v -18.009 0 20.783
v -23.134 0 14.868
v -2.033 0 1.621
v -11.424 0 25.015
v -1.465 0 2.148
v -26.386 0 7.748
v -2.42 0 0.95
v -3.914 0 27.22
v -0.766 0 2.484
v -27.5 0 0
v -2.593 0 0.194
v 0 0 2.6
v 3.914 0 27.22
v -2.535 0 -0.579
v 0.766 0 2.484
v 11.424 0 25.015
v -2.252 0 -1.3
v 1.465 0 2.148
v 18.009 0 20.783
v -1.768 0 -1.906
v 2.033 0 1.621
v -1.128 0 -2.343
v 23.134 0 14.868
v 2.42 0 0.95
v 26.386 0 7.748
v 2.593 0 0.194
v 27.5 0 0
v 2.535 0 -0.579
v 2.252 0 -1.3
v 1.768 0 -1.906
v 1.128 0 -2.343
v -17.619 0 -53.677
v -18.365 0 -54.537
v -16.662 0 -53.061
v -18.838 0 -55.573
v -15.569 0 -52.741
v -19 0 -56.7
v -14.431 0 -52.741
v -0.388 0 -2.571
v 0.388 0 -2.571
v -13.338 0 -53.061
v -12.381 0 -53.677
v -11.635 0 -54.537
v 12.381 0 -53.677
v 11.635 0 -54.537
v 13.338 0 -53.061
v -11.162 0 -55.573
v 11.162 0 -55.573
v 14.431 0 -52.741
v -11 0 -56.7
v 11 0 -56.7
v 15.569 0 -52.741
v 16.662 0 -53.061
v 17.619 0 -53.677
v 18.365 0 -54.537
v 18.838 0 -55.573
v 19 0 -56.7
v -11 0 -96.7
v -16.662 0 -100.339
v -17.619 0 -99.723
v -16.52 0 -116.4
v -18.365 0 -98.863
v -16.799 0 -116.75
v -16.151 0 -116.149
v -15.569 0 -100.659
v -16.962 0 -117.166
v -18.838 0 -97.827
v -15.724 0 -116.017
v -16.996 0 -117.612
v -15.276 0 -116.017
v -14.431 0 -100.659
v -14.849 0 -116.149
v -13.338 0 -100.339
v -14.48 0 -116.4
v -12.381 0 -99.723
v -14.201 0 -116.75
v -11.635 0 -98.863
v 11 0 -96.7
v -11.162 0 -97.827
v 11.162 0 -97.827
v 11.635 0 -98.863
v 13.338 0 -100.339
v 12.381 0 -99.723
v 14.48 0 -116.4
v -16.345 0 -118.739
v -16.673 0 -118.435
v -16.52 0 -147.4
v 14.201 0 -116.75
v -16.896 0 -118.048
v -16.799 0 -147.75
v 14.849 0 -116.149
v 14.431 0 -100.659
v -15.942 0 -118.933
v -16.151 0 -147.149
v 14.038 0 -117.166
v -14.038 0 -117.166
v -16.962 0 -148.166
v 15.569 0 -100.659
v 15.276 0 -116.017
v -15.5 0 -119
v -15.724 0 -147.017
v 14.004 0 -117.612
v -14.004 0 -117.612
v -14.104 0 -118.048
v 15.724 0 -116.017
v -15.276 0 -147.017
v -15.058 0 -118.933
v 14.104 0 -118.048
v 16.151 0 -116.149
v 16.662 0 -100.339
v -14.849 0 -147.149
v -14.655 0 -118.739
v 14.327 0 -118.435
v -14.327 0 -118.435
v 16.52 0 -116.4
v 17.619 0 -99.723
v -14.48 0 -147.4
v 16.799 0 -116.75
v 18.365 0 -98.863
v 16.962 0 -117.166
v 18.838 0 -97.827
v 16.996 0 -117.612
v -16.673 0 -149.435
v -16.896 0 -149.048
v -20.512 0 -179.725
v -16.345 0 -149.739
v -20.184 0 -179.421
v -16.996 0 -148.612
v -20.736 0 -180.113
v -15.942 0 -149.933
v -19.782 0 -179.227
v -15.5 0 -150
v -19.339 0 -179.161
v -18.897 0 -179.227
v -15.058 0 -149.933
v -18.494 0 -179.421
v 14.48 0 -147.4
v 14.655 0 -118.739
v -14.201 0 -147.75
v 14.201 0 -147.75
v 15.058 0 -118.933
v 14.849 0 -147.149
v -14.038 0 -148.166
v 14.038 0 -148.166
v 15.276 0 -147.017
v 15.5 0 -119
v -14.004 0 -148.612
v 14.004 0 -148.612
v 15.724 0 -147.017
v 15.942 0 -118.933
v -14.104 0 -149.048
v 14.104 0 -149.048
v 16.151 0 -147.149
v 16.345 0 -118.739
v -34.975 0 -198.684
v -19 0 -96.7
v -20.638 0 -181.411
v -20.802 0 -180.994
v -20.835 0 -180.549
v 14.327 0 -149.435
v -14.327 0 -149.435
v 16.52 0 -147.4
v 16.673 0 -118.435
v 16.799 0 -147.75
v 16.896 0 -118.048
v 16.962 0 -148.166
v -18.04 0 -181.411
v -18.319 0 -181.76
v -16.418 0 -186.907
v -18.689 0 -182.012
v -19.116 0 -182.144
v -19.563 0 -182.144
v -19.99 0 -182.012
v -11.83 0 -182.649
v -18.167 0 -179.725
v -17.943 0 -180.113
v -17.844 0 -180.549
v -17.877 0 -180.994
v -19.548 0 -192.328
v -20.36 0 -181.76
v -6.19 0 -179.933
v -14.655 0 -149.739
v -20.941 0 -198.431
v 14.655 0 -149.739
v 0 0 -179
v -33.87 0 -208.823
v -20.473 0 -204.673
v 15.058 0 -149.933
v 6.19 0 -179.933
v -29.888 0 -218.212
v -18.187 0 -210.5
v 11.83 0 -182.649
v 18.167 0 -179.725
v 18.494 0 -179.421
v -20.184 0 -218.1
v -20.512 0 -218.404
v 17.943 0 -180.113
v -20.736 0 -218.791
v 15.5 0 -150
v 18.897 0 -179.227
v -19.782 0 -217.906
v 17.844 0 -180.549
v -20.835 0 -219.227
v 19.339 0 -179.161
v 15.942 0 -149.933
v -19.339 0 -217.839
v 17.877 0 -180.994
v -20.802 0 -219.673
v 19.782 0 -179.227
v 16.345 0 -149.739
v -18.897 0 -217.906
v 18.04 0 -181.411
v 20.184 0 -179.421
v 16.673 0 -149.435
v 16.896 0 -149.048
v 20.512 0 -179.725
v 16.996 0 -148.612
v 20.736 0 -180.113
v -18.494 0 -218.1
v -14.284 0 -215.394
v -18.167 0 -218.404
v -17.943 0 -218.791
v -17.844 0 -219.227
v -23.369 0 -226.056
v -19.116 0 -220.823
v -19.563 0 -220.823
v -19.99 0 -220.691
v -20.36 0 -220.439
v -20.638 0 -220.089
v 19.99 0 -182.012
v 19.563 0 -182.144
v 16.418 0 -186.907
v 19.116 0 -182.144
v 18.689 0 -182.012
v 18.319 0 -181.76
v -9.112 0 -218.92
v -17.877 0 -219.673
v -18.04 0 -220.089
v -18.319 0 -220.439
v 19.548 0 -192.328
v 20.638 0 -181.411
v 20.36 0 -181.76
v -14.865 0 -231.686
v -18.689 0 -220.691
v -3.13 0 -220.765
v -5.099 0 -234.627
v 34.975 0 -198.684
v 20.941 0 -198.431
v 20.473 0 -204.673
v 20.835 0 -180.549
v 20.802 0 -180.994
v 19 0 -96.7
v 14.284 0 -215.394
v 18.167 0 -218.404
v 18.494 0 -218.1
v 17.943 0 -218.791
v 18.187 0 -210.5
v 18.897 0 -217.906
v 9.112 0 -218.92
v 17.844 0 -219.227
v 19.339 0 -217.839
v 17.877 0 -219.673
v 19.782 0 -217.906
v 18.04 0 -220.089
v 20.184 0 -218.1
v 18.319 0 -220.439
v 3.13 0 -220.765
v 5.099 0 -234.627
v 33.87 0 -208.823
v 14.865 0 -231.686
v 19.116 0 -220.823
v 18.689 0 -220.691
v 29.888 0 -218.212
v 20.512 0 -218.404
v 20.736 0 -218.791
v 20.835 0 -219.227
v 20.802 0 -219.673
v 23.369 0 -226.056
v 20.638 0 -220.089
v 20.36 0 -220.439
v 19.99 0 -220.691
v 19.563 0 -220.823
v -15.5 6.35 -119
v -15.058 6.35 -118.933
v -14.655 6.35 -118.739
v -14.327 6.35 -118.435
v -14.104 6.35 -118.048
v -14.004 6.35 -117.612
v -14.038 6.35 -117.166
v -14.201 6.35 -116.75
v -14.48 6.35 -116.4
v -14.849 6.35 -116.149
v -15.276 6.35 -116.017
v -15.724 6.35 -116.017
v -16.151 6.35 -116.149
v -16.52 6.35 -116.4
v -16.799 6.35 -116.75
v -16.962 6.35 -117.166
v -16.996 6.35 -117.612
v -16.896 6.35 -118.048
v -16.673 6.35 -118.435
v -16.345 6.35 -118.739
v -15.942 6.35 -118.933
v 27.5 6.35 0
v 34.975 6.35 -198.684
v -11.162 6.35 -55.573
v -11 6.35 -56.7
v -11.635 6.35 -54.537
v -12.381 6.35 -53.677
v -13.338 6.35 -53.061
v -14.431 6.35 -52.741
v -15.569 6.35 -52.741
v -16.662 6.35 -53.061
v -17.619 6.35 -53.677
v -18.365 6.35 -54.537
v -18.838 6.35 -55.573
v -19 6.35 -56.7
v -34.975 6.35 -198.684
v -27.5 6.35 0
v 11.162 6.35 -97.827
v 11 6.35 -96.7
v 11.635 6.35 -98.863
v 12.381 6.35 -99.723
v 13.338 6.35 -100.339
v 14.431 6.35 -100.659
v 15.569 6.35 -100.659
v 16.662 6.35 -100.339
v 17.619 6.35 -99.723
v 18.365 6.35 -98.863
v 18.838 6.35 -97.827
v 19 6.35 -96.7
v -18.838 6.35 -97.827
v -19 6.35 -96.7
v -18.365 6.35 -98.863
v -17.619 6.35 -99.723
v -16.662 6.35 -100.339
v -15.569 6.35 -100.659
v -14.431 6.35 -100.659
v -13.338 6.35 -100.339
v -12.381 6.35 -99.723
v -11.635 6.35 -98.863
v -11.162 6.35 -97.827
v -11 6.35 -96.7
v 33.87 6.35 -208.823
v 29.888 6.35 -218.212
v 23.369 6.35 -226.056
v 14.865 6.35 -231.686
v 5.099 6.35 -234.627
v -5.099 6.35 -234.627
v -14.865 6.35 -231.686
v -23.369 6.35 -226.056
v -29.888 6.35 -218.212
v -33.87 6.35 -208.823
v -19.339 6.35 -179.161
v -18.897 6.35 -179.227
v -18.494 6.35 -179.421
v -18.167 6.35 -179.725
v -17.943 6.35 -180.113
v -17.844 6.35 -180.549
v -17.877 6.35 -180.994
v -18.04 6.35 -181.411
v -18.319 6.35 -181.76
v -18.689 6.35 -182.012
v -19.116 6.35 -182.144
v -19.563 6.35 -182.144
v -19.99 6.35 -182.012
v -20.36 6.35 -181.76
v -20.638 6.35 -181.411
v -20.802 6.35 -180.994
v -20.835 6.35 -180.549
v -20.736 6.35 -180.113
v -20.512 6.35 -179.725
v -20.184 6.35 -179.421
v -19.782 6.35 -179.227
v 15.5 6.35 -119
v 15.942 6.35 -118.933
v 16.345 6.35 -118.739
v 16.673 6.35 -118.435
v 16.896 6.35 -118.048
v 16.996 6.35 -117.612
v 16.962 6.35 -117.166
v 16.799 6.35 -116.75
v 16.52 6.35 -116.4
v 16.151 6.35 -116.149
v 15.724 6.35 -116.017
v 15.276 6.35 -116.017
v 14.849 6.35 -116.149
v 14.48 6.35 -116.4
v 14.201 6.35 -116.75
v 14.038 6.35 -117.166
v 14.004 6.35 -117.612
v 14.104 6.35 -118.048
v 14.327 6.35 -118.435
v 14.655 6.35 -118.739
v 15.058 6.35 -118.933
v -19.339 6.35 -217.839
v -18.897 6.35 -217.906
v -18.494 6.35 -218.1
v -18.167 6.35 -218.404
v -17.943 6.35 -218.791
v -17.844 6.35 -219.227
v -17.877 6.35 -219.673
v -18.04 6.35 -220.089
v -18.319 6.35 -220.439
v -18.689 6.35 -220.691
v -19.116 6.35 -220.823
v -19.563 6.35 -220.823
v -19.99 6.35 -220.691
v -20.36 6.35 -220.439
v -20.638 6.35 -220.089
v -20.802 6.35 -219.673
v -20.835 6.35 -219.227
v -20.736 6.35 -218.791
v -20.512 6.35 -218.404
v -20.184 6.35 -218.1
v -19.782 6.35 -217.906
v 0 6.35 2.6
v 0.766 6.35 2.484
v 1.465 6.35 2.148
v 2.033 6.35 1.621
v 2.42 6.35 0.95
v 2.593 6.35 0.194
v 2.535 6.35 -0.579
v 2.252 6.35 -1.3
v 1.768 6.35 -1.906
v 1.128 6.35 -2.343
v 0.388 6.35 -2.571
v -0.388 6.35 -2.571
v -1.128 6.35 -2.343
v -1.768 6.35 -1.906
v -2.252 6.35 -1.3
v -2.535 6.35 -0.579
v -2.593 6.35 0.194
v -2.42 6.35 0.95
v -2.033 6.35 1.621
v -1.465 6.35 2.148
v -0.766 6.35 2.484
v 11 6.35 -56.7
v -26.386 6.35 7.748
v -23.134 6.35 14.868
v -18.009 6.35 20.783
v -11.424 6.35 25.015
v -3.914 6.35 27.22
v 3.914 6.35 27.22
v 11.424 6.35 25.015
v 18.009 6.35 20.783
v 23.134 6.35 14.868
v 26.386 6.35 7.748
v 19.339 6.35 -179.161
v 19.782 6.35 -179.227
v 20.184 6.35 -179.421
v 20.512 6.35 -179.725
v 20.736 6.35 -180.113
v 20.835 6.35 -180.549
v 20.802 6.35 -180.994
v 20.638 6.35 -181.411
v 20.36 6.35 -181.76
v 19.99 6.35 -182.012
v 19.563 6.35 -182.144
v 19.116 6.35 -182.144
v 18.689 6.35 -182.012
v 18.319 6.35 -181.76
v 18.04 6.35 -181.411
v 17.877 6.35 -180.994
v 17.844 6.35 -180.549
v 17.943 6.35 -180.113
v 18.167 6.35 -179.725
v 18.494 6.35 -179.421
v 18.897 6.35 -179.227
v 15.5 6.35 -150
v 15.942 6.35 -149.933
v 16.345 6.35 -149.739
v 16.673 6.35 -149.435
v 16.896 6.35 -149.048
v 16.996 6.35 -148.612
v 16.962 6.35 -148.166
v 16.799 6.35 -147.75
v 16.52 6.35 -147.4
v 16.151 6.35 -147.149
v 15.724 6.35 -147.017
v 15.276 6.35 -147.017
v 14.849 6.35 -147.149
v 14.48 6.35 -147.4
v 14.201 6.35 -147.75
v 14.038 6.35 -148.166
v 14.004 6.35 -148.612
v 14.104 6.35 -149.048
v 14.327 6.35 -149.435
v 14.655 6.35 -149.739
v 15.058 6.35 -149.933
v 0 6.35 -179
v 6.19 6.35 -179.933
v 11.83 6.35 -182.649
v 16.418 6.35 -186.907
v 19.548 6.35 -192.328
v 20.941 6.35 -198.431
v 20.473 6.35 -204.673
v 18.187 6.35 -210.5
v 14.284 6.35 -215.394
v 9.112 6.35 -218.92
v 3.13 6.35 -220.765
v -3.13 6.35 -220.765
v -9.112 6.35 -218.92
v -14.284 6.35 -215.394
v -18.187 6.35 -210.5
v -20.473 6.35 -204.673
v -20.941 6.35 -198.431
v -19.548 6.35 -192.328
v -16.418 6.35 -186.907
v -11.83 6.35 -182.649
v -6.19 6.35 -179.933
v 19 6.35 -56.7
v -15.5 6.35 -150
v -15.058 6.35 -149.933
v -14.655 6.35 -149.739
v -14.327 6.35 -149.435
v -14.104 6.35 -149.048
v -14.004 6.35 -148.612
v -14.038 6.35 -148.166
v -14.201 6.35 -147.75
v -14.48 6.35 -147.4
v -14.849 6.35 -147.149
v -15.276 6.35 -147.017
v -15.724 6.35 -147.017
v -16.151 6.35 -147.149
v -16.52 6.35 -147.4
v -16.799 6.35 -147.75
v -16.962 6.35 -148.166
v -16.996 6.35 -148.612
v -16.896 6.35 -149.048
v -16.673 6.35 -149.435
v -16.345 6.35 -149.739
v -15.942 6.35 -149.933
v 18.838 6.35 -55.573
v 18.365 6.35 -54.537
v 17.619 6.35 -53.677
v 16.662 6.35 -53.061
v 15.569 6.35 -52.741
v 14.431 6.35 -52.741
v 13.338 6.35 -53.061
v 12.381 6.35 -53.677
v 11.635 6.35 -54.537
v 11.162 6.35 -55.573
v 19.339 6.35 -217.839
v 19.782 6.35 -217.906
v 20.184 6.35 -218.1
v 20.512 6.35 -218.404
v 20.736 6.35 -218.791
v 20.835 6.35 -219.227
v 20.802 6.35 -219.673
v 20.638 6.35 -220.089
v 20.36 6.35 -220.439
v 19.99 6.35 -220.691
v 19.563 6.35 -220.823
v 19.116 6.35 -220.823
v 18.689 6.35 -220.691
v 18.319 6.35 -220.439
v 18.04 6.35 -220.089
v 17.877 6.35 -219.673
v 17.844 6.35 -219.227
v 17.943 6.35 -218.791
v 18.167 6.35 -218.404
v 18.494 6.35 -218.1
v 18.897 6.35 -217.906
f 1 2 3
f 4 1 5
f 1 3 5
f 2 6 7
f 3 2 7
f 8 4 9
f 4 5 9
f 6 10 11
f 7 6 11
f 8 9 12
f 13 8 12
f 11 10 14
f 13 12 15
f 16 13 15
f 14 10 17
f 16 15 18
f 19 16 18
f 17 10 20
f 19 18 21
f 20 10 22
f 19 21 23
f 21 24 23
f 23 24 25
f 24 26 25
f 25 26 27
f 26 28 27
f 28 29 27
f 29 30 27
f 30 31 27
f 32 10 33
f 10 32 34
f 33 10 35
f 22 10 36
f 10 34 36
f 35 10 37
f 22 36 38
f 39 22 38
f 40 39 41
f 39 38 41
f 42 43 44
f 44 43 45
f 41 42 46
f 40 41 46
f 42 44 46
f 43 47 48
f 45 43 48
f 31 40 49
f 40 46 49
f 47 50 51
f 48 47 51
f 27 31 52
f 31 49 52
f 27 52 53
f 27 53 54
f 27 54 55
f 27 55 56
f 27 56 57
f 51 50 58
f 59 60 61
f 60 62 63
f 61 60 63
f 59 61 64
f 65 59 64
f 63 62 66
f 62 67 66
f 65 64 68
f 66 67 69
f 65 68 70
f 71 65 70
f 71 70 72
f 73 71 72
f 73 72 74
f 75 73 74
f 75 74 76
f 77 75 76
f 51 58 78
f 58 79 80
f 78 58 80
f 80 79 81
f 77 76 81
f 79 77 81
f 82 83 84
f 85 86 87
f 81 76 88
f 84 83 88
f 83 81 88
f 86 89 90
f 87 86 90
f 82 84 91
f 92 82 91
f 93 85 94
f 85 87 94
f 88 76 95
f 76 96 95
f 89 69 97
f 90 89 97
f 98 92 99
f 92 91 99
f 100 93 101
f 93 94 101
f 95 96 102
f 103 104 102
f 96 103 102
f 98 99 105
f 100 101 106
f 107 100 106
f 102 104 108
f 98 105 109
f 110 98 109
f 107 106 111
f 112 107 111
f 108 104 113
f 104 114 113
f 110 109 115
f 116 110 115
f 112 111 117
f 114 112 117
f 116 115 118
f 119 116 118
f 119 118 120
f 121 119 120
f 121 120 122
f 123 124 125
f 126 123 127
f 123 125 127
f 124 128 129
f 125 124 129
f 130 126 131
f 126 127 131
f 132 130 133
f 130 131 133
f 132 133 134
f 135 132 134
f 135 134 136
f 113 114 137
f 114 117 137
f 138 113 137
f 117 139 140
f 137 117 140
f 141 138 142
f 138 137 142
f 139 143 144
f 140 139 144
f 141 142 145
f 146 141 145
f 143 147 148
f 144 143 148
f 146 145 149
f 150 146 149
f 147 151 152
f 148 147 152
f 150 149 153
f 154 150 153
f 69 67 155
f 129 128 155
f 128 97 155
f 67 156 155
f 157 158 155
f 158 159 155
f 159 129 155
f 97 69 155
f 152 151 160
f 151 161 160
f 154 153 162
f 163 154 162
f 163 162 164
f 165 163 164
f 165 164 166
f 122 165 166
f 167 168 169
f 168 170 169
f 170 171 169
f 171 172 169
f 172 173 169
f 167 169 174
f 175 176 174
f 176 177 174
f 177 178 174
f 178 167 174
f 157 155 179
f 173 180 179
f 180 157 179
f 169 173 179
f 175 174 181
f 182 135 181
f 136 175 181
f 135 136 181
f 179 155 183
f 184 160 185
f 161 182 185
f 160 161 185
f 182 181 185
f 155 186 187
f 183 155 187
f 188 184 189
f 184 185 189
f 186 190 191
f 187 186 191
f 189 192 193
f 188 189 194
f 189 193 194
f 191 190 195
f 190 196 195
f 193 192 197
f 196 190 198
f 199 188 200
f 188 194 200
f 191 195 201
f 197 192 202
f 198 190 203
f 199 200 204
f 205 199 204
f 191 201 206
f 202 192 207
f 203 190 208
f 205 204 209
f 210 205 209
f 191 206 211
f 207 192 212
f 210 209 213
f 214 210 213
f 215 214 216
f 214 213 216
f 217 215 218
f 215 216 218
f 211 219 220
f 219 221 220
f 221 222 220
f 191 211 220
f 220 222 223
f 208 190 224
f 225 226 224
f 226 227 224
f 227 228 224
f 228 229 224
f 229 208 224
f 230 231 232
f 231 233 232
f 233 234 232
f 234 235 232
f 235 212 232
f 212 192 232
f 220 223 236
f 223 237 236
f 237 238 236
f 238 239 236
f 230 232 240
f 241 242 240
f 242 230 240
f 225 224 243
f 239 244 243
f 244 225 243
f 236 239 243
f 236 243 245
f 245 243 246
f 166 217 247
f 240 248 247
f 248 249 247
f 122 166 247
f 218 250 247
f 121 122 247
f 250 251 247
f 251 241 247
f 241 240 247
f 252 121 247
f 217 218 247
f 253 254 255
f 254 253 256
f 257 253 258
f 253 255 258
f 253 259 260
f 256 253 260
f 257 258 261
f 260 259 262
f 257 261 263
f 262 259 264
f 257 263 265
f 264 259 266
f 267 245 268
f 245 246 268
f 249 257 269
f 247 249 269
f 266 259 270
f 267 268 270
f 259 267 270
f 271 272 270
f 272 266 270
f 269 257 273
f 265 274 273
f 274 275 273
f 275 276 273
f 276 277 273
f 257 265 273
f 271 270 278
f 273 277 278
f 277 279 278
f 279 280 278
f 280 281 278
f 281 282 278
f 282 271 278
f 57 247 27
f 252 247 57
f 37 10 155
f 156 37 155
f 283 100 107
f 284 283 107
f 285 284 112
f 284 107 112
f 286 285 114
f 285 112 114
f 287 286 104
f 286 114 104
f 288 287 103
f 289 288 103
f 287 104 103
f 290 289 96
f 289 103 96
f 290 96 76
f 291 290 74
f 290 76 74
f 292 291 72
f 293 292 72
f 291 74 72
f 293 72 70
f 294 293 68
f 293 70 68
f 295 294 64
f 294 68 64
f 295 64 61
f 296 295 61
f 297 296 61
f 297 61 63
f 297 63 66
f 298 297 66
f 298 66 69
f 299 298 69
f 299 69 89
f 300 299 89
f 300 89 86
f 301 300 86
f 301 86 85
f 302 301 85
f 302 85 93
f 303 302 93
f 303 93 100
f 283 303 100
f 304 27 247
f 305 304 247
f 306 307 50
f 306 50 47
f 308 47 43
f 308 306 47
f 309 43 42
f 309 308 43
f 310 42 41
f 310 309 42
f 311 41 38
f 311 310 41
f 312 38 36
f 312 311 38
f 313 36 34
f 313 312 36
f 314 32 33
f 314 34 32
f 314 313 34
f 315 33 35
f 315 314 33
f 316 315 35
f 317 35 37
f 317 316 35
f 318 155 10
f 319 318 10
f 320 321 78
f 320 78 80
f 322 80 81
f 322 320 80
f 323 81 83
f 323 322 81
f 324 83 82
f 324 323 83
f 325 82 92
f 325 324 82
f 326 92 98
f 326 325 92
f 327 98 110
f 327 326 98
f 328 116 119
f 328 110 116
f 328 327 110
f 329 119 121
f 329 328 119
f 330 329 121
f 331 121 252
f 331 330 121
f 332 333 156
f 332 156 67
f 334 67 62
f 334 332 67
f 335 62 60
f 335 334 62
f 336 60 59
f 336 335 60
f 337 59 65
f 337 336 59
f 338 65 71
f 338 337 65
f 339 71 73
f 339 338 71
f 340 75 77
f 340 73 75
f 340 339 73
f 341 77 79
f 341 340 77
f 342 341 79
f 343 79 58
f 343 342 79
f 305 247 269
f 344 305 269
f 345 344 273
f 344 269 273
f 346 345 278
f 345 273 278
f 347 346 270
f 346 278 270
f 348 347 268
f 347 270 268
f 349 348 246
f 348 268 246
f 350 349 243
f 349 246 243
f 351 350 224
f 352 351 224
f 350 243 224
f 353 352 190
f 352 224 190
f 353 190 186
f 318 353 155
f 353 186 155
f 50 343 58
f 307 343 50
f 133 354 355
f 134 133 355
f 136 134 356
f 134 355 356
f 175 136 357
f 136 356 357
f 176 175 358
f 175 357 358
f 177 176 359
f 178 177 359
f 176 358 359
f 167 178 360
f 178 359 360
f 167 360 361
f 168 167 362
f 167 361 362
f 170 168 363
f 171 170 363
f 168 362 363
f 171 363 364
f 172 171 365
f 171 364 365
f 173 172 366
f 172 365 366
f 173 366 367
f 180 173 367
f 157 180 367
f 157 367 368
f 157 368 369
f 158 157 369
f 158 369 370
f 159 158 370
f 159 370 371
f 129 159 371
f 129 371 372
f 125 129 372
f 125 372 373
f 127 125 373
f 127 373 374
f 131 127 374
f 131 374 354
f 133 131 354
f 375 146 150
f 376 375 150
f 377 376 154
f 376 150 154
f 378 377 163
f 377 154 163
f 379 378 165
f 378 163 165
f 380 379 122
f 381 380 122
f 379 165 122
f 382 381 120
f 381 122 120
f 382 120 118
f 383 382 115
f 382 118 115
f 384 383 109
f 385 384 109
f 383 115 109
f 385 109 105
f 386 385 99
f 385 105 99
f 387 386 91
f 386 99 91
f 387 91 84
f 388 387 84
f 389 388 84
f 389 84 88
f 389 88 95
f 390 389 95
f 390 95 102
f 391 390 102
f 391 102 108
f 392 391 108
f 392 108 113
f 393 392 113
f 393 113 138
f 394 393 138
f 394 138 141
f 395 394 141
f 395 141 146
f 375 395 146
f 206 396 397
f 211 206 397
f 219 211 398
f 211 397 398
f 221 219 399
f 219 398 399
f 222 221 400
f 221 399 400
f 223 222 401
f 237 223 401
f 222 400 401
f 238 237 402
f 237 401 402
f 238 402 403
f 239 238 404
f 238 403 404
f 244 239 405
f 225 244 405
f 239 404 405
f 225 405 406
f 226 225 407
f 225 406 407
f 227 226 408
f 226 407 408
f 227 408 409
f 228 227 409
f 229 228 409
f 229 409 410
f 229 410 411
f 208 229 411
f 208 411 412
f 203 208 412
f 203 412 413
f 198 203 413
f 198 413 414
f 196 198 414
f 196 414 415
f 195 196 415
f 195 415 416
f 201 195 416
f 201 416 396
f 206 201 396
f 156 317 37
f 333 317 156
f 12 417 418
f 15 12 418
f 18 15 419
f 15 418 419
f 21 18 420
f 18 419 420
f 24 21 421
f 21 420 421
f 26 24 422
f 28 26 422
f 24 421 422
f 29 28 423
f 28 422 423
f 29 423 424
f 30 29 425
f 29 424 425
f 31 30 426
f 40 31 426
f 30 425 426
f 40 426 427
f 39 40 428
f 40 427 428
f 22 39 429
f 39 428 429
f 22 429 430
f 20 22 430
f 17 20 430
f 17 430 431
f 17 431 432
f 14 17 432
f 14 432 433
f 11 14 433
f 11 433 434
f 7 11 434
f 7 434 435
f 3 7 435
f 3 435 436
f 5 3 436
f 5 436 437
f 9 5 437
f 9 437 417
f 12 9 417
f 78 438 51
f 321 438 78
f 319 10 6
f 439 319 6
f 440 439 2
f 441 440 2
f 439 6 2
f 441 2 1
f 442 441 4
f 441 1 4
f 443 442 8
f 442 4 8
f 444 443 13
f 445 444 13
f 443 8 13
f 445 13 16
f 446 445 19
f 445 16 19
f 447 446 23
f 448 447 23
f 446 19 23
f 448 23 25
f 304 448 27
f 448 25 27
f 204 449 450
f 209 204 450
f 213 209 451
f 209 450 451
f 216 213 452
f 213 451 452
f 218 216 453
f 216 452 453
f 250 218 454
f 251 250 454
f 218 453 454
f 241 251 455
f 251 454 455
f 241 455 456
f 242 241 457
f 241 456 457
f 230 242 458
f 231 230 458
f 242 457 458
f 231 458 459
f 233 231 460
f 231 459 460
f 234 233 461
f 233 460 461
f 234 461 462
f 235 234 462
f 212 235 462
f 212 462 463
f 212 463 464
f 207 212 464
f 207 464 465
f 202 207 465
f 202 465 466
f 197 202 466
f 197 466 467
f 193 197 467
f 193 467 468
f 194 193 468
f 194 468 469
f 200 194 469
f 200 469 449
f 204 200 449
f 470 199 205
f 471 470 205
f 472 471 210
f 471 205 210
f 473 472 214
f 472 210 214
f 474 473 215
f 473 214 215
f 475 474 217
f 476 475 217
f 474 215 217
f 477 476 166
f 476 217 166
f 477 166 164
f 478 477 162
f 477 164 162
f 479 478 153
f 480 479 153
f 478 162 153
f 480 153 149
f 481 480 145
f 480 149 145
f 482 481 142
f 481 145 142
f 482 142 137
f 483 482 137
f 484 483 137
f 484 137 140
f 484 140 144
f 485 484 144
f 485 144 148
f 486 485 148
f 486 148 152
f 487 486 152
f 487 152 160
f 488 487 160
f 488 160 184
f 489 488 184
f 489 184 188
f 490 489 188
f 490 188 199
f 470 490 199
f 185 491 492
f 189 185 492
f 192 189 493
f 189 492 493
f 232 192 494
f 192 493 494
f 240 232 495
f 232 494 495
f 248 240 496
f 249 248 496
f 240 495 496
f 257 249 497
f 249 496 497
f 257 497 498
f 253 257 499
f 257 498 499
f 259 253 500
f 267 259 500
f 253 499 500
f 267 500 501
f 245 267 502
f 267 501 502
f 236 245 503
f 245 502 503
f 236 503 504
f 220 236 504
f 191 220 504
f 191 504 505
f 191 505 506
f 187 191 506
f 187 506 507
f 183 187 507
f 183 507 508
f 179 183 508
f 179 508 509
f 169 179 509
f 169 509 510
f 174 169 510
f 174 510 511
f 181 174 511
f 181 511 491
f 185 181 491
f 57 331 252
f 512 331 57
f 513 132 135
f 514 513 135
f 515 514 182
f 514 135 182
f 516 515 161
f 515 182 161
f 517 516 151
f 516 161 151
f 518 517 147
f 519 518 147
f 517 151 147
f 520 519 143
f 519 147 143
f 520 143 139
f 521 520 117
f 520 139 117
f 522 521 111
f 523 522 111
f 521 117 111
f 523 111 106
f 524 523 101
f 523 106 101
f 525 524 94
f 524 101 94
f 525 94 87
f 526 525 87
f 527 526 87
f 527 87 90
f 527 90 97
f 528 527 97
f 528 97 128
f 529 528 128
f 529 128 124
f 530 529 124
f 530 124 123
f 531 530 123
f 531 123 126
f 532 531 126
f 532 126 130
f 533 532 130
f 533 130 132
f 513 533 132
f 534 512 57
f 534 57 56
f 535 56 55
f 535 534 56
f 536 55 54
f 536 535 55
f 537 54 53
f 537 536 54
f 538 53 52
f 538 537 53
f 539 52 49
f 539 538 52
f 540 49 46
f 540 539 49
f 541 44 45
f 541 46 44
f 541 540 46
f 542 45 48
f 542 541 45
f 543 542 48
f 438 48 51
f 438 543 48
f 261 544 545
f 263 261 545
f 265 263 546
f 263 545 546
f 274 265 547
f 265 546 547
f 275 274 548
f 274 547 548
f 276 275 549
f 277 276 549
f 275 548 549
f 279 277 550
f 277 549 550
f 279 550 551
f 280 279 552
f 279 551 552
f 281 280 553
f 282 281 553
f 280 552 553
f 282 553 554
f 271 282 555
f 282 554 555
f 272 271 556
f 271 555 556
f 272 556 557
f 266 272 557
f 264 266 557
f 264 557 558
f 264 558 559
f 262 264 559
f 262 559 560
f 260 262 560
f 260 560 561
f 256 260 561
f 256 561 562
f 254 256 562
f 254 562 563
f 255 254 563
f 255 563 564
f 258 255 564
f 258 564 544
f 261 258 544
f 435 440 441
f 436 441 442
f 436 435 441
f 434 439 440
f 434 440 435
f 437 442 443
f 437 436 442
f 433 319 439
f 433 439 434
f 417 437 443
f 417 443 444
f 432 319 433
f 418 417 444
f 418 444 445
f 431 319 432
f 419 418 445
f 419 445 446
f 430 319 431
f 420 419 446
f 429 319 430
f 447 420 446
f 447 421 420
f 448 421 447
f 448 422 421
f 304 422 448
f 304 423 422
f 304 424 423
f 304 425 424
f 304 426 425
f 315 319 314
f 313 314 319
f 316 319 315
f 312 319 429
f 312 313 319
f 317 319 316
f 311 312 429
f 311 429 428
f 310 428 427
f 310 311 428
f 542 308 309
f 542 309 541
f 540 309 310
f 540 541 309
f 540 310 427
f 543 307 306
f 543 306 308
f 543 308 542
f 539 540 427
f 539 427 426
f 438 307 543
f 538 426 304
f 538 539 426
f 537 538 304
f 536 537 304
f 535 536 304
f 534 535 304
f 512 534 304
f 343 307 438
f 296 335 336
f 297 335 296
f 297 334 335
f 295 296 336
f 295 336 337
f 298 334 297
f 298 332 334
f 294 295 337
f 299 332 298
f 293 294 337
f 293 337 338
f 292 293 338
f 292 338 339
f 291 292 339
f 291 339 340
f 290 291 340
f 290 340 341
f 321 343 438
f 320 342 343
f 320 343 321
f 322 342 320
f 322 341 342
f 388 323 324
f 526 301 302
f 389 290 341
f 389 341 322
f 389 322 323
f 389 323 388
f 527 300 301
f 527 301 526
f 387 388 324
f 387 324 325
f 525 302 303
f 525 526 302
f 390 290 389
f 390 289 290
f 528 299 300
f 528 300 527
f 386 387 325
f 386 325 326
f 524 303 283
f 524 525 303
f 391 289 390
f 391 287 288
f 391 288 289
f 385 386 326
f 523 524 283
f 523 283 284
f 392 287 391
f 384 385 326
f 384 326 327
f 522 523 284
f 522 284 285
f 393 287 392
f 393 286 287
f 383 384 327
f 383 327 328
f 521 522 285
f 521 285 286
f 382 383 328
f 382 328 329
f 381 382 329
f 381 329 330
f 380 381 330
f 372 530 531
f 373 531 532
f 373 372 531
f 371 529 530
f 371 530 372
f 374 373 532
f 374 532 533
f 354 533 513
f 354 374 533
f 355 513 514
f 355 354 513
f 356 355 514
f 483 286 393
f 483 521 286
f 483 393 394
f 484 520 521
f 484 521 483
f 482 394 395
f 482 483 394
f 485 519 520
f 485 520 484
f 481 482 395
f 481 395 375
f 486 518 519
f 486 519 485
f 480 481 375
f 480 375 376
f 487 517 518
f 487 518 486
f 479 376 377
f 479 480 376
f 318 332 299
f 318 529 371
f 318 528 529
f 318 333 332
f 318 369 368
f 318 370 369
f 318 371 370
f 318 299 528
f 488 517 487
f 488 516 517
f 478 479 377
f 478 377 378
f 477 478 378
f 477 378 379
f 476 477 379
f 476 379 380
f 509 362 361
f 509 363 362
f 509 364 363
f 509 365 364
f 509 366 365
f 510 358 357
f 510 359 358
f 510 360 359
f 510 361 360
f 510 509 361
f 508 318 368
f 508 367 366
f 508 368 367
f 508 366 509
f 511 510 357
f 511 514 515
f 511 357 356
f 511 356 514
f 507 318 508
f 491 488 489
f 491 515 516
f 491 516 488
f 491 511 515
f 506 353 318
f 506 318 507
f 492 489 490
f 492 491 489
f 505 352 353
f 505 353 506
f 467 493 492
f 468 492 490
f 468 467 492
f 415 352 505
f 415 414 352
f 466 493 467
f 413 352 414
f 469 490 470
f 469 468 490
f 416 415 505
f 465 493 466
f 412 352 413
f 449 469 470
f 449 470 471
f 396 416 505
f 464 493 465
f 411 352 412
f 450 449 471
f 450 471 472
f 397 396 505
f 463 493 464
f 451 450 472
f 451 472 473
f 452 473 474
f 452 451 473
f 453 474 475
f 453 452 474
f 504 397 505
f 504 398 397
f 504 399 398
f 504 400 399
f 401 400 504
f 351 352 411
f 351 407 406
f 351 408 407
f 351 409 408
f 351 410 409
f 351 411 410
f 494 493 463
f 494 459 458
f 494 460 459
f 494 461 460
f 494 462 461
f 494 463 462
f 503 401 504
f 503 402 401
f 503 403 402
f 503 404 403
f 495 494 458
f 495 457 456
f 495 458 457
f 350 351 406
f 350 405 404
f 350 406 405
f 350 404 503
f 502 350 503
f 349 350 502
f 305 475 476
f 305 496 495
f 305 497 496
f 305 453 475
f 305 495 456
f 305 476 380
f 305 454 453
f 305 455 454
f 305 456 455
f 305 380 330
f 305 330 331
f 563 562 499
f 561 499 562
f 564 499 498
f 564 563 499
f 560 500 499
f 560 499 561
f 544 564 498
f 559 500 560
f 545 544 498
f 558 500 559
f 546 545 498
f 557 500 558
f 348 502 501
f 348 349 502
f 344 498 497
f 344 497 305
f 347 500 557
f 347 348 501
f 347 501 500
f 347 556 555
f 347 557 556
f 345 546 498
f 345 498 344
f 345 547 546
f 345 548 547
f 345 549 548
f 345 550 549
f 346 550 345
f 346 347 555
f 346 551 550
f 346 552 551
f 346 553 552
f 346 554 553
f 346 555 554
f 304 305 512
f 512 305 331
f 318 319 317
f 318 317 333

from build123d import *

# Parameters (mm, degrees)
BOSS_EXTRUDE1_DEPTH     = 6.35
SKETCH2_R               = 2.6
CUT_EXTRUDE1_DEPTH      = 238.676928834
ESQUISSE3_R             = 21
ENL_V_MAT_EXTRU_2_DEPTH = 238.676928834
ESQUISSE7_R             = 1.5
ENL_V_MAT_EXTRU_3_DEPTH = 238.676928834
CUT_EXTRUDE3_DEPTH      = 238.676928834
SKETCH5_R               = 1.5
CUT_EXTRUDE4_DEPTH      = 238.676928834


with BuildPart() as part:
    # Sketch1 → Boss-Extrude1 (new body)
    with BuildSketch(Plane(origin=(0, 0, 0), x_dir=(1, 0, 0), z_dir=(0, 1, 0))):
        with BuildLine():
            Line((27.5, 0), (34.975254116, 198.684097441))
            ThreePointArc((34.975254116, 198.684097441), (0, 235), (-34.975254116, 198.684097441))
            Line((-34.975254116, 198.684097441), (-27.5, 0))
            ThreePointArc((-27.5, 0), (0, -27.5), (27.5, 0))
        make_face()
    extrude(amount=BOSS_EXTRUDE1_DEPTH)

    # Sketch2 → Cut-Extrude1 (cut, through all)
    with BuildSketch(Plane(origin=(0, 6.35, 0), x_dir=(1, 0, 0), z_dir=(0, 1, 0))):
        with Locations(Location((0, 0, 0), (0, 0, 270))):
            Circle(SKETCH2_R)
    extrude(amount=-CUT_EXTRUDE1_DEPTH, mode=Mode.SUBTRACT)

    # Esquisse3 → Enlèv. mat.-Extru.2 (cut, through all)
    with BuildSketch(Plane(origin=(0, 6.35, 0), x_dir=(1, 0, 0), z_dir=(0, 1, 0))):
        with Locations(Location((0, 200, 0), (0, 0, 270))):
            Circle(ESQUISSE3_R)
    extrude(amount=-ENL_V_MAT_EXTRU_2_DEPTH, mode=Mode.SUBTRACT)

    # Esquisse7 → Enlèv. mat.-Extru.3 (cut, through all)
    with BuildSketch(Plane(origin=(0, 6.35, 0), x_dir=(1, 0, 0), z_dir=(0, 1, 0))):
        with Locations(Location((-19.339370465, 219.339370465, 0), (0, 0, 270))):
            Circle(ESQUISSE7_R)
        with Locations(Location((19.339370465, 219.339370465, 0), (0, 0, 270))):
            Circle(ESQUISSE7_R)
        with Locations(Location((19.339370465, 180.660629535, 0), (0, 0, 270))):
            Circle(ESQUISSE7_R)
        with Locations(Location((-19.339370465, 180.660629535, 0), (0, 0, 270))):
            Circle(ESQUISSE7_R)
    extrude(amount=-ENL_V_MAT_EXTRU_3_DEPTH, mode=Mode.SUBTRACT)

    # Sketch4 → Cut-Extrude3 (cut, through all)
    with BuildSketch(Plane(origin=(0, 6.35, 0), x_dir=(1, 0, 0), z_dir=(0, 1, 0))):
        with BuildLine():
            Line((-19, 56.7), (-19, 96.7))
            ThreePointArc((-19, 96.7), (-15, 100.7), (-11, 96.7))
            Line((-11, 96.7), (-11, 56.7))
            ThreePointArc((-11, 56.7), (-15, 52.7), (-19, 56.7))
        make_face()
        with BuildLine():
            Line((11, 56.7), (11, 96.7))
            ThreePointArc((11, 96.7), (15, 100.7), (19, 96.7))
            Line((19, 96.7), (19, 56.7))
            ThreePointArc((19, 56.7), (15, 52.7), (11, 56.7))
        make_face()
    extrude(amount=-CUT_EXTRUDE3_DEPTH, mode=Mode.SUBTRACT)

    # Sketch5 → Cut-Extrude4 (cut, through all)
    with BuildSketch(Plane.XZ):
        with Locations(Location((15.5, -117.5, 0), (0, 0, 270))):
            Circle(SKETCH5_R)
        with Locations(Location((15.5, -148.5, 0), (0, 0, 270))):
            Circle(SKETCH5_R)
        with Locations(Location((-15.5, -148.5, 0), (0, 0, 270))):
            Circle(SKETCH5_R)
        with Locations(Location((-15.5, -117.5, 0), (0, 0, 270))):
            Circle(SKETCH5_R)
    extrude(amount=-CUT_EXTRUDE4_DEPTH, mode=Mode.SUBTRACT)


solid = part.part
